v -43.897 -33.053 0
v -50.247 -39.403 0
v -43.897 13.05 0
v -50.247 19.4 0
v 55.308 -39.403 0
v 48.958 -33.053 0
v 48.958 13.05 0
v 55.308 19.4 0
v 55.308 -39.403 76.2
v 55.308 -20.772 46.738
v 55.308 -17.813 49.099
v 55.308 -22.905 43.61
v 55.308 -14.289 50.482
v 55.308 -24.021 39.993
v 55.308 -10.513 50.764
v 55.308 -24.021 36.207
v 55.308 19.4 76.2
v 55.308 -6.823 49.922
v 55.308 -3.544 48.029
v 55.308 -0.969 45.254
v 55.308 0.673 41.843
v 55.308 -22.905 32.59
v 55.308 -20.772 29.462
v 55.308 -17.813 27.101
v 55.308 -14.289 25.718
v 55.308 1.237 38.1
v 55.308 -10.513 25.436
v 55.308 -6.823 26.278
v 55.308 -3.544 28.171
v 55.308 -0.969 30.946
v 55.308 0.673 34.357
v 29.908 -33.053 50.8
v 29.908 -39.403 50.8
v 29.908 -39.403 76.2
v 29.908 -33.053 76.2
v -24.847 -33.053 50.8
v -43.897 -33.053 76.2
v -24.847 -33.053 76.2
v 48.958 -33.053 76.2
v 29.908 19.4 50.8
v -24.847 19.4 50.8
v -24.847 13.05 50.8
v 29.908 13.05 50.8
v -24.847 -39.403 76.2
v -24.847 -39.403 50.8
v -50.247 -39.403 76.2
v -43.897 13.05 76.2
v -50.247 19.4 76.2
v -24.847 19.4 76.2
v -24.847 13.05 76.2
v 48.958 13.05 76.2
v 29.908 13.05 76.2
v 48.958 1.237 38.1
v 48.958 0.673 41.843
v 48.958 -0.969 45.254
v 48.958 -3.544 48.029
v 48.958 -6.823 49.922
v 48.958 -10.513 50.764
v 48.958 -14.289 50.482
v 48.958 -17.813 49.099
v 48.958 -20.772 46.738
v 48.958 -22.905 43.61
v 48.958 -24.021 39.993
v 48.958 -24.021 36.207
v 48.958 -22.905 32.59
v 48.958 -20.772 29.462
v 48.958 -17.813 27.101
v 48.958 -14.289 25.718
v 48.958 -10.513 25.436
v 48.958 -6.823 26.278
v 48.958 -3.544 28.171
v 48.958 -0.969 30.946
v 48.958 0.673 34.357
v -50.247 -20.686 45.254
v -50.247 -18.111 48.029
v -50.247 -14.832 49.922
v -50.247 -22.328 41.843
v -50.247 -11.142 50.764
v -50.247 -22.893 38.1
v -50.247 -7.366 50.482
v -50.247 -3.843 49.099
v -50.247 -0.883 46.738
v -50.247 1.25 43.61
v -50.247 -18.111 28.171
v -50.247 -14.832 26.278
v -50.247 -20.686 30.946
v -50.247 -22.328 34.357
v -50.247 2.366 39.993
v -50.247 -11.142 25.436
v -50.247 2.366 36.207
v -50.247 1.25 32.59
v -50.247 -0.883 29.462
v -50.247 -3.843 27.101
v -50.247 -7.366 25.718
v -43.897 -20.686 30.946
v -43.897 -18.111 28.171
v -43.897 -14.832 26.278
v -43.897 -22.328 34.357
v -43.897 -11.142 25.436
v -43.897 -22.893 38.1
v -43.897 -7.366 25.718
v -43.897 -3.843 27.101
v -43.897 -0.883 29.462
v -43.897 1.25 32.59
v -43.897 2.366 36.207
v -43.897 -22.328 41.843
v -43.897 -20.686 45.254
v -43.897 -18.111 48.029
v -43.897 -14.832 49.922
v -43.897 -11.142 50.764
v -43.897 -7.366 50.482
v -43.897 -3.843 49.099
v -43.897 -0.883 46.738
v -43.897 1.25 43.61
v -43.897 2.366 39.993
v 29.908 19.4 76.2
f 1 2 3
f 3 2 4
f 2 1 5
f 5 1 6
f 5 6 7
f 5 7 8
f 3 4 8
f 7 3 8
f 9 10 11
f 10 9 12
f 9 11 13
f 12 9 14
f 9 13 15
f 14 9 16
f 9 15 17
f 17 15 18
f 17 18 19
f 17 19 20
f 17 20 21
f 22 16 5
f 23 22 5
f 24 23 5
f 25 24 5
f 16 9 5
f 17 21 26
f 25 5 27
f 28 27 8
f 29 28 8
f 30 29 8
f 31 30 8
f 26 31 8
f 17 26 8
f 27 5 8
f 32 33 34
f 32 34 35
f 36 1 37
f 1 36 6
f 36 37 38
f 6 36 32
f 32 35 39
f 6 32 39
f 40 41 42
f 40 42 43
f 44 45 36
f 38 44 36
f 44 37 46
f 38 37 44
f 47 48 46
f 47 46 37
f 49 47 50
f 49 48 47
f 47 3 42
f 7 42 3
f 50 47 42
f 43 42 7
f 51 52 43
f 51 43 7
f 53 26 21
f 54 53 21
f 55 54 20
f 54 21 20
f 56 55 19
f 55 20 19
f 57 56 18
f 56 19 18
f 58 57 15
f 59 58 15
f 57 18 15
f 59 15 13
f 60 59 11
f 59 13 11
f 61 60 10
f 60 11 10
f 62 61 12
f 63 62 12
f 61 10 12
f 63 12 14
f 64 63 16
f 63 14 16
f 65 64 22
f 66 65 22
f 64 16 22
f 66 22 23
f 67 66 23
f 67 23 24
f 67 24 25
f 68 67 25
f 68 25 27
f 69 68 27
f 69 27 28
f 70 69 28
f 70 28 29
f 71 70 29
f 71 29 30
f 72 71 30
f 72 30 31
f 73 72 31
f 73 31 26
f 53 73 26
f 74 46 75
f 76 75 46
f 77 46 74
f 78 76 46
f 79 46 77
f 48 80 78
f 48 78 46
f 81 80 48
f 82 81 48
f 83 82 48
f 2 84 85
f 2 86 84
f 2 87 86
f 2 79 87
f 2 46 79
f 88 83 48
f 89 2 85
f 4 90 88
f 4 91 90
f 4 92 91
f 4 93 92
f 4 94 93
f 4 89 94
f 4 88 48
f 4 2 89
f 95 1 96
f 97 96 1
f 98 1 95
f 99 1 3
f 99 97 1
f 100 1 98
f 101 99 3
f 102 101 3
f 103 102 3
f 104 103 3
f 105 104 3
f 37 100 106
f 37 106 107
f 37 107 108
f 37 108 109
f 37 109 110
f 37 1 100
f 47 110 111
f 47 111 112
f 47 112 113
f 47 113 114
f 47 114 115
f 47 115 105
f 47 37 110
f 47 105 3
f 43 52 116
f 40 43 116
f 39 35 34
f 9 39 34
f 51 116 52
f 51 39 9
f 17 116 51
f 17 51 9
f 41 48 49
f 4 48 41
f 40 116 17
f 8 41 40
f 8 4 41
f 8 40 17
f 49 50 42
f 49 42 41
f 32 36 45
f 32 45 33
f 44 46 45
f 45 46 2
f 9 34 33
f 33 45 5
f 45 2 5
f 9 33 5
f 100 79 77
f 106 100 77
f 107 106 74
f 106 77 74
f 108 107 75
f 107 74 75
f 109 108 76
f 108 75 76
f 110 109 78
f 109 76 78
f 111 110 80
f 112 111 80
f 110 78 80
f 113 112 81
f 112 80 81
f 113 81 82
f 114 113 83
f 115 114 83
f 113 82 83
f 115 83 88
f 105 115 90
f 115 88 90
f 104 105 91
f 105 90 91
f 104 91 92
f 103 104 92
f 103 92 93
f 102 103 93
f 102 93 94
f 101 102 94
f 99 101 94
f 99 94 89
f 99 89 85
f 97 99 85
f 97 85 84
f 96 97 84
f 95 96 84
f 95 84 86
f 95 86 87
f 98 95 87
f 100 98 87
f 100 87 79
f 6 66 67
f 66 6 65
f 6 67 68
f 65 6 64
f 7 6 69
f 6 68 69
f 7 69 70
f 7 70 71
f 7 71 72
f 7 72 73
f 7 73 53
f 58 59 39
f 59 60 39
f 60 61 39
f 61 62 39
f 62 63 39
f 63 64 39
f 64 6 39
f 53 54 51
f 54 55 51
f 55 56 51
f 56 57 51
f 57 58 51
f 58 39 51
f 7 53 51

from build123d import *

# Parameters (mm, degrees)
F0_W     = 105.55536
F0_H     = 58.80253
F1_DEPTH = 76.2
F2_W     = 92.85536
F2_H     = 46.10253
F3_DEPTH = 76.2
F4_W     = 54.75536
F4_H     = 6.35
F5_DEPTH = 25.4
F6_R     = 12.7
F7_DEPTH = 25.4
F8_R     = 12.7
F9_DEPTH = 25.4


with BuildPart() as f1:
    # F0 (on Top) → F1 (new body)
    with BuildSketch(Plane.XY):
        with Locations((2.530435, -10.00125)):
            Rectangle(F0_W, F0_H)
    extrude(amount=F1_DEPTH)

    # F2 (on face) → F3 (cut, through all)
    with BuildSketch(Plane.XY.offset(76.2)):
        with Locations((2.530435, -10.00125)):
            Rectangle(F2_W, F2_H)
    extrude(amount=-F3_DEPTH, mode=Mode.SUBTRACT)

    # F4 (on face) → F5 (cut)
    with BuildSketch(Plane.XY.offset(76.2)):
        with Locations((2.530435, -36.227515)):
            Rectangle(F4_W, F4_H)
        with Locations((2.530435, 16.225015)):
            Rectangle(F4_W, F4_H)
    extrude(amount=-F5_DEPTH, mode=Mode.SUBTRACT)

    # F6 (on face) → F7 (cut)
    with BuildSketch(Plane.YZ.offset(55.308115)):
        with Locations((-11.462515, 38.1)):
            Circle(F6_R)
    extrude(amount=-F7_DEPTH, mode=Mode.SUBTRACT)

    # F8 (on face) → F9 (cut)
    with BuildSketch(Plane(origin=(-50.247245, 0, 0), x_dir=(0, -1, 0), z_dir=(-1, 0, 0))):
        with Locations((10.192515, 38.1)):
            Circle(F8_R)
    extrude(amount=-F9_DEPTH, mode=Mode.SUBTRACT)


solid = f1.part
